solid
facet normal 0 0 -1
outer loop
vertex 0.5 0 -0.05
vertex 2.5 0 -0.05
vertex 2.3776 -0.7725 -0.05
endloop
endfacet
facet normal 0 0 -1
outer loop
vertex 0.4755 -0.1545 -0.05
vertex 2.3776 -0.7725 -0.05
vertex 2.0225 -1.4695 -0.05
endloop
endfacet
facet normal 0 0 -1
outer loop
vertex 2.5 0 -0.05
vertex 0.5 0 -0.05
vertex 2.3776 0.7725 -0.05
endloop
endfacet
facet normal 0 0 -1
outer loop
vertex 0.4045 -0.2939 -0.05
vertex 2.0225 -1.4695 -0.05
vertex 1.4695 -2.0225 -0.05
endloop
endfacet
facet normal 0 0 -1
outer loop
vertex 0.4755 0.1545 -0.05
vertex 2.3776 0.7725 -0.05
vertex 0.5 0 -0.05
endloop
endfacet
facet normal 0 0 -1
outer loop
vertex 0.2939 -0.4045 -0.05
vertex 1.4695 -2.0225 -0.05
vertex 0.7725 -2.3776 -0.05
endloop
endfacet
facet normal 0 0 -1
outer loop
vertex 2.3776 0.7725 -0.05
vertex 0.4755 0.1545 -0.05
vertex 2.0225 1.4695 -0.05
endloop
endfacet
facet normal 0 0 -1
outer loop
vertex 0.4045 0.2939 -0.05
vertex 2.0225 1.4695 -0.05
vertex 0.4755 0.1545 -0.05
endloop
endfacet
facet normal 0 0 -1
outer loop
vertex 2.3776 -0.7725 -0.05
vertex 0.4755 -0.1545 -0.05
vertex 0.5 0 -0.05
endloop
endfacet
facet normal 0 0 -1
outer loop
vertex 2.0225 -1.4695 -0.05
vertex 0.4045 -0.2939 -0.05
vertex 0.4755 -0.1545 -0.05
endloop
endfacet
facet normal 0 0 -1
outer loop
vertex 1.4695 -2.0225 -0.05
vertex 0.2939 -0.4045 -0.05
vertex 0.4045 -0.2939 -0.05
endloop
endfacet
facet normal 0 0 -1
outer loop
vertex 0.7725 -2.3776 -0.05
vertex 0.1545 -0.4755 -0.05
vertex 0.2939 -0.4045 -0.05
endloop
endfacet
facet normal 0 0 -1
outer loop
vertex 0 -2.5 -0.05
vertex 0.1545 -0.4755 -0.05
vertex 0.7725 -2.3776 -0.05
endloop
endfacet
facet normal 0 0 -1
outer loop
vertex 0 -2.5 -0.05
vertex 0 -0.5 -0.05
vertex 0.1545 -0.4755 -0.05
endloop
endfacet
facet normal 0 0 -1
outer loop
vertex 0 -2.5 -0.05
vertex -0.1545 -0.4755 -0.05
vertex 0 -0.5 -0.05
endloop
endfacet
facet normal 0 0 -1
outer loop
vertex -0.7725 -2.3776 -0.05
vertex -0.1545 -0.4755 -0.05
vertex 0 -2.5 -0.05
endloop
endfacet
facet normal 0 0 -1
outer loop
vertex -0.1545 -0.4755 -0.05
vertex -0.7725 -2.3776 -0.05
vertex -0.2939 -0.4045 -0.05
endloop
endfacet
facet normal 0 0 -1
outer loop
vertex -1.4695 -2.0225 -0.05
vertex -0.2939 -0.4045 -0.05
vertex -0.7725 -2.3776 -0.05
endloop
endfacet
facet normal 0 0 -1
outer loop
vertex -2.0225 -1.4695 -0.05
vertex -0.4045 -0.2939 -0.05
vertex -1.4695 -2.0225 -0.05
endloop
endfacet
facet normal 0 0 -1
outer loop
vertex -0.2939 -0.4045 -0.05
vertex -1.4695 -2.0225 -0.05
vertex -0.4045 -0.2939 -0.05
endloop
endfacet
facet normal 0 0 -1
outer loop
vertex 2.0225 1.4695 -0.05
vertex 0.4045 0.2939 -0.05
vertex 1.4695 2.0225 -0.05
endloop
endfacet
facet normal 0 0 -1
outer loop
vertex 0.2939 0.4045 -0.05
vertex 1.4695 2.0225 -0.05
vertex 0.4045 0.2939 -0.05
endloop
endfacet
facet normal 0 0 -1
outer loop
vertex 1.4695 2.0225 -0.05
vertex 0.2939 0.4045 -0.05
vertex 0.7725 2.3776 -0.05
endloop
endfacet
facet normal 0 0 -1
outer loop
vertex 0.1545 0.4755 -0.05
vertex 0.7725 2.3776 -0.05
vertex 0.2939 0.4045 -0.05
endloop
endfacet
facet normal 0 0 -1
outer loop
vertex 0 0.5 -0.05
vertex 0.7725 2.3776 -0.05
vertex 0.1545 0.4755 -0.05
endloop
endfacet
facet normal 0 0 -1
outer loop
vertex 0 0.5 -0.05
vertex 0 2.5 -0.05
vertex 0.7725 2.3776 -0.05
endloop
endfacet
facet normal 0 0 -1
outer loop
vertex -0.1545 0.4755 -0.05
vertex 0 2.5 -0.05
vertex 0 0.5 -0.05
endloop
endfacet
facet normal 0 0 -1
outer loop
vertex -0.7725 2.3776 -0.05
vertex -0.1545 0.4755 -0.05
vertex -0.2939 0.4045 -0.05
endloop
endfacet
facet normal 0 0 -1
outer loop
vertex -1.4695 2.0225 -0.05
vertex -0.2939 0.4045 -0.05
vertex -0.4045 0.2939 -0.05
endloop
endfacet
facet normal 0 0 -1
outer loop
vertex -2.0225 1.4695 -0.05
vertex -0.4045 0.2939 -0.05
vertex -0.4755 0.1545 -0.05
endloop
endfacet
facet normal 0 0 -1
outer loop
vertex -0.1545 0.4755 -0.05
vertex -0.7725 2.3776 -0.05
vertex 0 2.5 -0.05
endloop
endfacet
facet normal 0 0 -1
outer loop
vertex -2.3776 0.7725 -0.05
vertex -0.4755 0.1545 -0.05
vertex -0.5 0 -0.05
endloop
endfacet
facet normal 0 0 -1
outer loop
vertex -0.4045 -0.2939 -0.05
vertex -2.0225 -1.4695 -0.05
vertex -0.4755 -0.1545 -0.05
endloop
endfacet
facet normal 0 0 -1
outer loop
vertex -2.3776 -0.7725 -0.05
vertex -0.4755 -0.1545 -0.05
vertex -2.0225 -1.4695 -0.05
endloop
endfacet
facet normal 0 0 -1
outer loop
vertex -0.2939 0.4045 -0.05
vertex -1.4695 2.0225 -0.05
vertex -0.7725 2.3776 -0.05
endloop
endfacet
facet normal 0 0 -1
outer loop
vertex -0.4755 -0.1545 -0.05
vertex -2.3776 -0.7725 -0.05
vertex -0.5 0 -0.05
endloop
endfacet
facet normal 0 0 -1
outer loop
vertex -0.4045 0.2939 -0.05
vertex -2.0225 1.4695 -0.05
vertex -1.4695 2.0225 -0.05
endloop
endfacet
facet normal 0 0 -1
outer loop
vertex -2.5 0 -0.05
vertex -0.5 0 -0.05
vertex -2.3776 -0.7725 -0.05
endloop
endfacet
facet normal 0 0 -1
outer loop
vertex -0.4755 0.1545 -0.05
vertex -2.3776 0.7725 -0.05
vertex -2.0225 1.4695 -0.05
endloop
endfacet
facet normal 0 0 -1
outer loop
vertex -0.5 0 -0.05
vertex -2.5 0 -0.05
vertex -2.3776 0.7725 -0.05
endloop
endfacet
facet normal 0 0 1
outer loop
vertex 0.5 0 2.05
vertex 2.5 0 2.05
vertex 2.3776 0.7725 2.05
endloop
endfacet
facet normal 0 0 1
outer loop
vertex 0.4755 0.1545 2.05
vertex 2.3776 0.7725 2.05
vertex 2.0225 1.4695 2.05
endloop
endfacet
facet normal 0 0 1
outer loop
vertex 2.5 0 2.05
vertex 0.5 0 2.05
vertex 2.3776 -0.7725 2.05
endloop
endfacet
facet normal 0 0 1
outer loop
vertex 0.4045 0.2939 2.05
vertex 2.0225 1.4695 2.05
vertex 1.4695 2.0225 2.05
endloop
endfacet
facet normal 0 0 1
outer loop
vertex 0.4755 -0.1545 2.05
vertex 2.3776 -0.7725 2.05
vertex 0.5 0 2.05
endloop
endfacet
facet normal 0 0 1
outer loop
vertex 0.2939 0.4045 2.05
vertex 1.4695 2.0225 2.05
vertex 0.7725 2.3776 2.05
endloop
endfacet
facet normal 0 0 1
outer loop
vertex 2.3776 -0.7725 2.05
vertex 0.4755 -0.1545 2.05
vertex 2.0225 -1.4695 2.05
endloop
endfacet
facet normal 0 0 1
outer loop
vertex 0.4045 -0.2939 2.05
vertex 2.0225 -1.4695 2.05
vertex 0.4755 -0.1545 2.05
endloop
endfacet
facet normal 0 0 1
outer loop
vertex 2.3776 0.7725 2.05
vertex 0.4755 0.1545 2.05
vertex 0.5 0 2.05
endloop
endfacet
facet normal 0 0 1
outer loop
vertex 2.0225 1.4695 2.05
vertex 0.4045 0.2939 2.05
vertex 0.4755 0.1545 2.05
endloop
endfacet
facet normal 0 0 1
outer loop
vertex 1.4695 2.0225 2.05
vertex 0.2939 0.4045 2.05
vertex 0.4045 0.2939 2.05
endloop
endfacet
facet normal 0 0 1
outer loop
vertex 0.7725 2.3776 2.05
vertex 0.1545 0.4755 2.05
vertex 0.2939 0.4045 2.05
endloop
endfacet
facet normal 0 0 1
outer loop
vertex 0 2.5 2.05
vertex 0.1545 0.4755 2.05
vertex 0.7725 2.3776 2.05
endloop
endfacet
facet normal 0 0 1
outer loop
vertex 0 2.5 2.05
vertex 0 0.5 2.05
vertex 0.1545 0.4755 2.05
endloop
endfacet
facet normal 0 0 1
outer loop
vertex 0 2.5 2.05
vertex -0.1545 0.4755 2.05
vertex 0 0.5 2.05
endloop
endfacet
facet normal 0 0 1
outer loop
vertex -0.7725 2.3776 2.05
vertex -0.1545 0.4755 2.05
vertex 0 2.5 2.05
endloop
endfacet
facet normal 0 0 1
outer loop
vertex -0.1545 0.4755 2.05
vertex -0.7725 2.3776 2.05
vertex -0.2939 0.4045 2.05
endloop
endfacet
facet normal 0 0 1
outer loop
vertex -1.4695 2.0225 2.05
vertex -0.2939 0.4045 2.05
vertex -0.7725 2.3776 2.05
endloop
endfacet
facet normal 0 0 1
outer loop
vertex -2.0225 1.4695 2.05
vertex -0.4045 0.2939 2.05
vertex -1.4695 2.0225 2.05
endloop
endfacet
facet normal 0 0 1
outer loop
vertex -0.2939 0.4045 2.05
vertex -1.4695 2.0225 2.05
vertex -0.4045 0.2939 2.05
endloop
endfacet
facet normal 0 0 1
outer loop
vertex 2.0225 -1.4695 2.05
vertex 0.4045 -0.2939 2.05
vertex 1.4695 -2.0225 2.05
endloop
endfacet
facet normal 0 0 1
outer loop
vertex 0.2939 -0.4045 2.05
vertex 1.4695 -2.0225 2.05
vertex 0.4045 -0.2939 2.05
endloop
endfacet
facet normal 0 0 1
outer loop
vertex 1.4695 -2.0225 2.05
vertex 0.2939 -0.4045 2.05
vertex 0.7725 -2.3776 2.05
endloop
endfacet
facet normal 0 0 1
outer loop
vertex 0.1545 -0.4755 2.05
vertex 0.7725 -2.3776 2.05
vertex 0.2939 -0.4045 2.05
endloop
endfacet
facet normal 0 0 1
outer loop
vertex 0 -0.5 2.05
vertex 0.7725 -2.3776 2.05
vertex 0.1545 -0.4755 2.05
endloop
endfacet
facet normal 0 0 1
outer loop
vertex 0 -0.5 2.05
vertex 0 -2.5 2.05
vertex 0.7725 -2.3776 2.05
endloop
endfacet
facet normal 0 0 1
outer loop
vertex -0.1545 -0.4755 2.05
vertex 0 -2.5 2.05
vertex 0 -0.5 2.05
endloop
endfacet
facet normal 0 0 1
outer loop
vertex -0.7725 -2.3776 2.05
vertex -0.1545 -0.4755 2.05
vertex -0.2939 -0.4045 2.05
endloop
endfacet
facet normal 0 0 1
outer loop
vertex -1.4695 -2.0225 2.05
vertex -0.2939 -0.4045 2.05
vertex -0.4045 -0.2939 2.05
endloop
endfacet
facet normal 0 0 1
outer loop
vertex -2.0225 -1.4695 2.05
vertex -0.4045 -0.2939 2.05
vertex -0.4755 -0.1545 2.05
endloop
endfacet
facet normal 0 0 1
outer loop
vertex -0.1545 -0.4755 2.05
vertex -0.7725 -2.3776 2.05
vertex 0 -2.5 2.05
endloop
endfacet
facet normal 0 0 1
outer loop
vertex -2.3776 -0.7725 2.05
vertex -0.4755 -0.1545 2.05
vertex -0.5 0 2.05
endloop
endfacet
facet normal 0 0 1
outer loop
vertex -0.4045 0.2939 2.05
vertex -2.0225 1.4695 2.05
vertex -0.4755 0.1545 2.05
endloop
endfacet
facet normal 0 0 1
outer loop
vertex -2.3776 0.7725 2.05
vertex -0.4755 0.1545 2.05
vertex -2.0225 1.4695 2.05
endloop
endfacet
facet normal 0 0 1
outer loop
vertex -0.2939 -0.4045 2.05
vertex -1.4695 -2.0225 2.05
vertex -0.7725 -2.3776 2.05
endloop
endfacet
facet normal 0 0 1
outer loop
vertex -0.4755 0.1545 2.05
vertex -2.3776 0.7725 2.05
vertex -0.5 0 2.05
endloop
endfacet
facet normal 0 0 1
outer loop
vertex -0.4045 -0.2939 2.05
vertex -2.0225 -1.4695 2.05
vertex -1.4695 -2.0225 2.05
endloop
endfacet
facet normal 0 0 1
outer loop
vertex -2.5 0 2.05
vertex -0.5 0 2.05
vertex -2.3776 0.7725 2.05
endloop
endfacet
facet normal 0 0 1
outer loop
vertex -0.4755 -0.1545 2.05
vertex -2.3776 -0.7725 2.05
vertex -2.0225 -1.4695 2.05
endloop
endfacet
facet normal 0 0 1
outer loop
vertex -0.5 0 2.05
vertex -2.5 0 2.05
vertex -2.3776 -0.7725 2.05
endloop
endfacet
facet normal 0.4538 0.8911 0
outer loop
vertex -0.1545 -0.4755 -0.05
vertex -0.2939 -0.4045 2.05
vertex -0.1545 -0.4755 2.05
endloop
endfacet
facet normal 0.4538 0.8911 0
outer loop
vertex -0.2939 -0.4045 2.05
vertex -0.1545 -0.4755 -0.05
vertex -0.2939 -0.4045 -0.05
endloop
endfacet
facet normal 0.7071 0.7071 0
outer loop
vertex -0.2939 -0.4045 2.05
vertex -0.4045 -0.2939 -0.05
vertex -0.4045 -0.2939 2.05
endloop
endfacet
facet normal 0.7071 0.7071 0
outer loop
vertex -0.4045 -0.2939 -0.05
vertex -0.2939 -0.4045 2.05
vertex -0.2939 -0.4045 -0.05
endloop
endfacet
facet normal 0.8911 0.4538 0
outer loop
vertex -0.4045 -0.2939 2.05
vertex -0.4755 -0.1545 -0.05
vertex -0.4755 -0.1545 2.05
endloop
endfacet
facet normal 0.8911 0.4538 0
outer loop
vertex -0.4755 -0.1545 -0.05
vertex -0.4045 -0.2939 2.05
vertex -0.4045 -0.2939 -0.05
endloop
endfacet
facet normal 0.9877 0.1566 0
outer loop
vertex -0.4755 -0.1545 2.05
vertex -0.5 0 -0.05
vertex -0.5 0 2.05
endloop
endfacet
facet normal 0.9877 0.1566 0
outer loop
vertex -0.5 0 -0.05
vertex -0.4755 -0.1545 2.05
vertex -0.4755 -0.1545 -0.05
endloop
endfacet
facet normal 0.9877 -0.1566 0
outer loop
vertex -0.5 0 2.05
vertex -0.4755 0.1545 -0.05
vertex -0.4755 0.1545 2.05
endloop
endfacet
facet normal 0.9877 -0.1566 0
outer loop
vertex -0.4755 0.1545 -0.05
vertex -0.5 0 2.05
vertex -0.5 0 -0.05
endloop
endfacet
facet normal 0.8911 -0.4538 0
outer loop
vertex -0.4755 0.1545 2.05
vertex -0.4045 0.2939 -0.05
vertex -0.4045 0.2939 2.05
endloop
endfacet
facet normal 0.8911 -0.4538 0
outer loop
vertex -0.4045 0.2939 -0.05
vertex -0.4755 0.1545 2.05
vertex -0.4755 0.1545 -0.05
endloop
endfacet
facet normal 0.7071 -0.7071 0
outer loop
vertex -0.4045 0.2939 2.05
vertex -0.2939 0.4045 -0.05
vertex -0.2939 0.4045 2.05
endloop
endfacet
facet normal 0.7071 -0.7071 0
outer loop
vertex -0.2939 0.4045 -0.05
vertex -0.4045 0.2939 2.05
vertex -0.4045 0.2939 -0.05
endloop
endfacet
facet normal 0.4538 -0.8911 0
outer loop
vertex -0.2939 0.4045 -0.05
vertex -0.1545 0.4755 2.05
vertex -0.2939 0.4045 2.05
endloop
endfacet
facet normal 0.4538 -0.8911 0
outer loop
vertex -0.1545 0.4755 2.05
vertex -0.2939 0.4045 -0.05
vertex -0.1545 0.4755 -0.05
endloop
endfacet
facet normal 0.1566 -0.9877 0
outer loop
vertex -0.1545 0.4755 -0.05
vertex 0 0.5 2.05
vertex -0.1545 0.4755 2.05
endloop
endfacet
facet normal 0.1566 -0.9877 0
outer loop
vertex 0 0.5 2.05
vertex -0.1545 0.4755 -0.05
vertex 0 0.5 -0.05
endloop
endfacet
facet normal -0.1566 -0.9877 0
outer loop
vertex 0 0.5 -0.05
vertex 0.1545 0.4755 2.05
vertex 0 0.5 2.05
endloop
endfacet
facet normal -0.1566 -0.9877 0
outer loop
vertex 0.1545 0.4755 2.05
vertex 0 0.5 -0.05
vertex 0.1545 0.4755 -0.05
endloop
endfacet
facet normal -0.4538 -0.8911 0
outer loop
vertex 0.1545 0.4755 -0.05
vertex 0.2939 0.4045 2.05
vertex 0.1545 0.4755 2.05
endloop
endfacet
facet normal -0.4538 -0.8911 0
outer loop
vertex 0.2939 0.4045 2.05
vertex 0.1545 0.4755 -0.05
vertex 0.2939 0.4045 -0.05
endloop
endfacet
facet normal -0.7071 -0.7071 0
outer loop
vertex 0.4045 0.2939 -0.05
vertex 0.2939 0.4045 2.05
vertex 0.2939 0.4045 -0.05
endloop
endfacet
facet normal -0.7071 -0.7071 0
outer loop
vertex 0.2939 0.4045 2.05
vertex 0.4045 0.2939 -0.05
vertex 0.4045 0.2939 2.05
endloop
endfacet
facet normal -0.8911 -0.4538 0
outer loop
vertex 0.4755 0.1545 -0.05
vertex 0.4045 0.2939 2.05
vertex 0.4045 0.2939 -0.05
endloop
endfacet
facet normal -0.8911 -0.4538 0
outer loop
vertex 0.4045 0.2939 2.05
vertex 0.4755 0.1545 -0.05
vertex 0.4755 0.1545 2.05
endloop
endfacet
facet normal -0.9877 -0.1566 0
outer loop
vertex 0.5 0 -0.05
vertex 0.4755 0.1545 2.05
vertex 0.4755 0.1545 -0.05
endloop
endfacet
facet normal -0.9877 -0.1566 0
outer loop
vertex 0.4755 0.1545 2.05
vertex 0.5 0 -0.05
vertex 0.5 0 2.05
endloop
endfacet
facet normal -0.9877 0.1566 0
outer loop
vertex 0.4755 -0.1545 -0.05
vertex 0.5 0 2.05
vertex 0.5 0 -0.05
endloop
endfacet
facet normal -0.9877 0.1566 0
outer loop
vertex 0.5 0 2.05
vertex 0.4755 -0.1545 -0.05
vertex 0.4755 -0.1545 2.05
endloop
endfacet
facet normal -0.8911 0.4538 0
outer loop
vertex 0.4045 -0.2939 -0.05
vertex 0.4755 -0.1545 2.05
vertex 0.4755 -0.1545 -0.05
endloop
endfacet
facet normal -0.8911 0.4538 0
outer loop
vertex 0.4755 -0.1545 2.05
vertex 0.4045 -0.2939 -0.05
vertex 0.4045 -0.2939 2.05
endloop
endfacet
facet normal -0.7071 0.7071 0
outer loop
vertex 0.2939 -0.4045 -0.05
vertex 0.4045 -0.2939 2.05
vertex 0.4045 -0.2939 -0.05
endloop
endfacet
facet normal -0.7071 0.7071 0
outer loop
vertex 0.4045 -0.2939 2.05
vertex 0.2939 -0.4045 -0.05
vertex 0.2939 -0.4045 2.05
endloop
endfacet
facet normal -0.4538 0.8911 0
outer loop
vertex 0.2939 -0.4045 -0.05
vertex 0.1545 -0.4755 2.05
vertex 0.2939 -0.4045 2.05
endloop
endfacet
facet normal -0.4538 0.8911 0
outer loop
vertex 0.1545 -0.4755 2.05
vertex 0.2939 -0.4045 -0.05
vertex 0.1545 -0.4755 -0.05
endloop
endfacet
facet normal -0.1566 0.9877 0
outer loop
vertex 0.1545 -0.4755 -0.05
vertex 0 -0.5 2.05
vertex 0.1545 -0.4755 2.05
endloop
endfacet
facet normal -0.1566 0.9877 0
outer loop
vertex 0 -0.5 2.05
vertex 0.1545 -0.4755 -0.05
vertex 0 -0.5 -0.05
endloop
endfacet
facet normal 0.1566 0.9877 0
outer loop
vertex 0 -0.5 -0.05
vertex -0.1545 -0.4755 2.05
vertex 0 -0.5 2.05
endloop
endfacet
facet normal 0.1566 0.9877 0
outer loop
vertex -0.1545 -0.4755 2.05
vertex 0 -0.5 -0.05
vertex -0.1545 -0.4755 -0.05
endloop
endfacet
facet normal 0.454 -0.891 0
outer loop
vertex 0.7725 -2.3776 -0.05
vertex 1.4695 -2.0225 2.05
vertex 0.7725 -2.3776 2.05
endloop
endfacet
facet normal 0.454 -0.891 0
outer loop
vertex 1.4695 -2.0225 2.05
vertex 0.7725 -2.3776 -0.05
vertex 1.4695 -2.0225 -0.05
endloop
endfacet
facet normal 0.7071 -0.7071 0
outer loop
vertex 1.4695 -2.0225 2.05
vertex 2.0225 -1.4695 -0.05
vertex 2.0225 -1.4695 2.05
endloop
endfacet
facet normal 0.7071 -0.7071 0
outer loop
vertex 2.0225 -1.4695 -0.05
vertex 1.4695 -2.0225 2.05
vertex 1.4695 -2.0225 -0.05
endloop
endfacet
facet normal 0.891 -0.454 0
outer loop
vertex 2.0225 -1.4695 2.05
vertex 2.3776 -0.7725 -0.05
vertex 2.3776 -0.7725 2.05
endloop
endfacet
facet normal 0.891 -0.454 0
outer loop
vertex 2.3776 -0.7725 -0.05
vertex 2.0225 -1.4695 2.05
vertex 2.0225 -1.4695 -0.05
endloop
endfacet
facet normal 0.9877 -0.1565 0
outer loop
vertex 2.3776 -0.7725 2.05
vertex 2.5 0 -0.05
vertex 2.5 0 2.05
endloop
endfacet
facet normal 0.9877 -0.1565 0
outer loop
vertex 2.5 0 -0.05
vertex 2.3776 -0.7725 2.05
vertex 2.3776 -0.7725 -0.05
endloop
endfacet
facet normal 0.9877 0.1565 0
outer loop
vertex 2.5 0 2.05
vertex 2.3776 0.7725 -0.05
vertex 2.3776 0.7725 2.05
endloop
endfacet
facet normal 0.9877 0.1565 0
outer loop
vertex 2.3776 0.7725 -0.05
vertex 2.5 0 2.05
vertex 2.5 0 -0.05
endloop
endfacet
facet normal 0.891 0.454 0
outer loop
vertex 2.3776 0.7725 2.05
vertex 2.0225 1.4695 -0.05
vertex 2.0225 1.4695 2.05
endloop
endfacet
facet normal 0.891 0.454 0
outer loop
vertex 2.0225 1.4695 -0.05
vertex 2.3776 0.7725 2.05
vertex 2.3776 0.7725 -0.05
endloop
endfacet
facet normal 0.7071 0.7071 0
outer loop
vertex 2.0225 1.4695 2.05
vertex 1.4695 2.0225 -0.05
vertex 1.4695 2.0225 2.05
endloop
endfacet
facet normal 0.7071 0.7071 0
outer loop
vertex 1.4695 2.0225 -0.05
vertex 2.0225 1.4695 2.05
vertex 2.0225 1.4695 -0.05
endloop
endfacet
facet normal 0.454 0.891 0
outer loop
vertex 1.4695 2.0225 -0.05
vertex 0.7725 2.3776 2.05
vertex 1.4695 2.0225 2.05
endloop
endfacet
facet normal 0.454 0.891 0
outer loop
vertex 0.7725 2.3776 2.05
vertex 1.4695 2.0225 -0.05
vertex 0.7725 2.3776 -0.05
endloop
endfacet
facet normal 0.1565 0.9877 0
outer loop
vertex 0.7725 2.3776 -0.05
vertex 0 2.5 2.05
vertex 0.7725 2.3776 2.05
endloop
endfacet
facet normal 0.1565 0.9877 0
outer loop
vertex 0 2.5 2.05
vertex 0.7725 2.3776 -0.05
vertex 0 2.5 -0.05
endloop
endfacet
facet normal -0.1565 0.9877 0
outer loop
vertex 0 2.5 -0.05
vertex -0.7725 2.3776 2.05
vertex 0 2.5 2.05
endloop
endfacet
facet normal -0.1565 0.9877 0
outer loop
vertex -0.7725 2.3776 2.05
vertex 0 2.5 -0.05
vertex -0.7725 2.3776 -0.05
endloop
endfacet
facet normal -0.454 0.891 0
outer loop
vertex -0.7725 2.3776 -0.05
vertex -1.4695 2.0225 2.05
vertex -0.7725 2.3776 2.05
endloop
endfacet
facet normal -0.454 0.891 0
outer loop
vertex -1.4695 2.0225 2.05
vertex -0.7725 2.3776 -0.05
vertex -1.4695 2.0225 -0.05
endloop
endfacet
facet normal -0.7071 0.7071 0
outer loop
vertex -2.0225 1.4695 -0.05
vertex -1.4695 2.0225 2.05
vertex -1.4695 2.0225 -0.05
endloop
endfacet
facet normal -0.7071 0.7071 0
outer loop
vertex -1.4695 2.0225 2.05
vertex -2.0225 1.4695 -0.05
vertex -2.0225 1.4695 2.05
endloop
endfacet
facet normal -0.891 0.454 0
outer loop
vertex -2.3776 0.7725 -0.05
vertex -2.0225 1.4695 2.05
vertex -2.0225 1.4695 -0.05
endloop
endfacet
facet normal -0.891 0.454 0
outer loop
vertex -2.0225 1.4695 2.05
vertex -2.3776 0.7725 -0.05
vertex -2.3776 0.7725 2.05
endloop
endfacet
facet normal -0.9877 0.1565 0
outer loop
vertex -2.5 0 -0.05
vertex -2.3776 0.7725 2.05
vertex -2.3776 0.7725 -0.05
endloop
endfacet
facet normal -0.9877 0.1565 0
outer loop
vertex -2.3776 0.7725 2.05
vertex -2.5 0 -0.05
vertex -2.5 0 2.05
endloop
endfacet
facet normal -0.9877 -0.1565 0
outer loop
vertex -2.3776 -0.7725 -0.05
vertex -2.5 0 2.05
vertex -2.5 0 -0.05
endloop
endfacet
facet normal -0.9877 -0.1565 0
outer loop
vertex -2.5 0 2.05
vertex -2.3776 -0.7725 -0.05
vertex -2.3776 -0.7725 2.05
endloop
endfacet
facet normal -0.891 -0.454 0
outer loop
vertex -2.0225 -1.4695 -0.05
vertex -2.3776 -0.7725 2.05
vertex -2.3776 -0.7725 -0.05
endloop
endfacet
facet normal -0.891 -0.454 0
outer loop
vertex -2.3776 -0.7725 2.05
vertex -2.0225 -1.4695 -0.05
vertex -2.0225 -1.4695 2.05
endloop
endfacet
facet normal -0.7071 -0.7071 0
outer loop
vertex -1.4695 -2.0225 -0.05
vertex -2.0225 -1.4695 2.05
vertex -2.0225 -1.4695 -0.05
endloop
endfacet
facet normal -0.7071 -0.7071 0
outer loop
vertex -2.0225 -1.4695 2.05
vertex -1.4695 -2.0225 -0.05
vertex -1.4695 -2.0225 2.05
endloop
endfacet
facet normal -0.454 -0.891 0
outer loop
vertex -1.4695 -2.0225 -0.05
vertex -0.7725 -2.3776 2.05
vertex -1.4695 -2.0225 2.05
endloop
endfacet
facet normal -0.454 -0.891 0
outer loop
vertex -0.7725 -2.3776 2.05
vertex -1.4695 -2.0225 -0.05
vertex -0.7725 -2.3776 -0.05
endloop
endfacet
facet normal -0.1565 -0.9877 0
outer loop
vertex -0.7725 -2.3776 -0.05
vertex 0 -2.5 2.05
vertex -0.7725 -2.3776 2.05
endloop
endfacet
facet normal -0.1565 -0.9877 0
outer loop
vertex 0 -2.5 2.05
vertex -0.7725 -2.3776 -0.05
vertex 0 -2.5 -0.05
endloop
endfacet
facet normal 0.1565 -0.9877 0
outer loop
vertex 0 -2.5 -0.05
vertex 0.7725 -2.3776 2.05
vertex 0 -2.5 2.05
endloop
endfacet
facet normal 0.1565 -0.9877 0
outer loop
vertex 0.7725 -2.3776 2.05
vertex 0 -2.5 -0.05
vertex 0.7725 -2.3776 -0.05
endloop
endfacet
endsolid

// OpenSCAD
/**
 * Module: Pad hole
 *
 * Author: Karim Aziiev <karim.aziiev@gmail.com>
 * License: GPL-3.0-or-later
 */

include <../colors.scad>

use <../lib/functions.scad>
use <../lib/shapes2d.scad>
use <../lib/shapes3d.scad>
use <../lib/transforms.scad>

function pad_hole_total_od(specs, bolt_d) =
  len(specs) > 0
  ? specs[len(specs) - 1][0]
  : bolt_d;

/** Module: Pad hole

    Create a multi-step circular pad around a bolt hole, defined by a set of
    diameter “bands”. Each band is rendered as a concentric ring and extruded
    to the requested thickness.

    Parameters:
    - `bolt_d`: Diameter of the central bolt hole (the innermost diameter).
    - `thickness` : Height of the pad in Z.
    - `specs` (list of 2-item lists): `[[dia1, color1], [dia2, color2], ...]`. Order does not matter.
    - `fn`: Circle resolution used for the generated rings.
    - `anchor`: Placement on the final X/Y/Z axes (default `[0, 0, 1]`).
    Each component is `1` to extend positively from the origin, `0` to
    center, or `-1` to extend negatively. Explicit `undef`, or an `undef`
    component, uses the corresponding default from `[1, 1, 1]`.
    - `orientation`: Logical width/length/height on X/Y/Z, respectively
       (default `"wlh"`; `undef` also uses `"wlh"`). Both width and length
       are the larger resolved end diameter. The direction from `d1` to `d2` is:
       - `"wlh"` or `"lwh"`: positive Z.
       - `"whl"`: negative Y; `"lhw"`: positive Y.
       - `"hlw"`: negative X; `"hwl"`: positive X.

    Notes:
    - Diameters should be strictly increasing relative to `bolt_d` to avoid
    zero/negative-width bands (i.e. each `dia` should be > previous diameter).

    Example:

    ```scad
    pad_hole(bolt_d=2.0, specs=[[3.4, "blue"], [4.0, "white"], [5.0, "red"]], thickness=2);
    ```
*/
module pad_hole(bolt_d,
                specs,
                thickness,
                tolerance=0.1,
                fn=20,
                orientation="wlh",
                anchor=[0, 0, 1]) {
  sorted_specs = sort_by_idx(elems=specs, idx=0, asc=true);
  total_d = pad_hole_total_od(sorted_specs, bolt_d);

  with_orientation(from="wlh",
                   to=orientation,
                   anchor=anchor,
                   size=[total_d, total_d, thickness]) {
    union() {
      for (i = [0 : len(sorted_specs) - 1]) {
        let (spec = specs[i],
             prev_spec_dia = i > 0 ? specs[i - 1][0] : bolt_d,
             dia = spec[0],
             colr = spec[1],
             w = (dia - prev_spec_dia) / 2) {
          color(colr, alpha=1) {
            translate([0, 0, -tolerance / 2]) {
              linear_extrude(height=thickness + tolerance,
                             center=false,
                             convexity=2) {
                ring_2d(w=w, r=dia / 2, fn=fn);
              }
            }
          }
        }
      }
    }
  }
}

pad_hole(bolt_d=1.0,
         specs=[[3.4, "blue"], [4.0, "white"], [5.0, "red"]],
         thickness=2);
